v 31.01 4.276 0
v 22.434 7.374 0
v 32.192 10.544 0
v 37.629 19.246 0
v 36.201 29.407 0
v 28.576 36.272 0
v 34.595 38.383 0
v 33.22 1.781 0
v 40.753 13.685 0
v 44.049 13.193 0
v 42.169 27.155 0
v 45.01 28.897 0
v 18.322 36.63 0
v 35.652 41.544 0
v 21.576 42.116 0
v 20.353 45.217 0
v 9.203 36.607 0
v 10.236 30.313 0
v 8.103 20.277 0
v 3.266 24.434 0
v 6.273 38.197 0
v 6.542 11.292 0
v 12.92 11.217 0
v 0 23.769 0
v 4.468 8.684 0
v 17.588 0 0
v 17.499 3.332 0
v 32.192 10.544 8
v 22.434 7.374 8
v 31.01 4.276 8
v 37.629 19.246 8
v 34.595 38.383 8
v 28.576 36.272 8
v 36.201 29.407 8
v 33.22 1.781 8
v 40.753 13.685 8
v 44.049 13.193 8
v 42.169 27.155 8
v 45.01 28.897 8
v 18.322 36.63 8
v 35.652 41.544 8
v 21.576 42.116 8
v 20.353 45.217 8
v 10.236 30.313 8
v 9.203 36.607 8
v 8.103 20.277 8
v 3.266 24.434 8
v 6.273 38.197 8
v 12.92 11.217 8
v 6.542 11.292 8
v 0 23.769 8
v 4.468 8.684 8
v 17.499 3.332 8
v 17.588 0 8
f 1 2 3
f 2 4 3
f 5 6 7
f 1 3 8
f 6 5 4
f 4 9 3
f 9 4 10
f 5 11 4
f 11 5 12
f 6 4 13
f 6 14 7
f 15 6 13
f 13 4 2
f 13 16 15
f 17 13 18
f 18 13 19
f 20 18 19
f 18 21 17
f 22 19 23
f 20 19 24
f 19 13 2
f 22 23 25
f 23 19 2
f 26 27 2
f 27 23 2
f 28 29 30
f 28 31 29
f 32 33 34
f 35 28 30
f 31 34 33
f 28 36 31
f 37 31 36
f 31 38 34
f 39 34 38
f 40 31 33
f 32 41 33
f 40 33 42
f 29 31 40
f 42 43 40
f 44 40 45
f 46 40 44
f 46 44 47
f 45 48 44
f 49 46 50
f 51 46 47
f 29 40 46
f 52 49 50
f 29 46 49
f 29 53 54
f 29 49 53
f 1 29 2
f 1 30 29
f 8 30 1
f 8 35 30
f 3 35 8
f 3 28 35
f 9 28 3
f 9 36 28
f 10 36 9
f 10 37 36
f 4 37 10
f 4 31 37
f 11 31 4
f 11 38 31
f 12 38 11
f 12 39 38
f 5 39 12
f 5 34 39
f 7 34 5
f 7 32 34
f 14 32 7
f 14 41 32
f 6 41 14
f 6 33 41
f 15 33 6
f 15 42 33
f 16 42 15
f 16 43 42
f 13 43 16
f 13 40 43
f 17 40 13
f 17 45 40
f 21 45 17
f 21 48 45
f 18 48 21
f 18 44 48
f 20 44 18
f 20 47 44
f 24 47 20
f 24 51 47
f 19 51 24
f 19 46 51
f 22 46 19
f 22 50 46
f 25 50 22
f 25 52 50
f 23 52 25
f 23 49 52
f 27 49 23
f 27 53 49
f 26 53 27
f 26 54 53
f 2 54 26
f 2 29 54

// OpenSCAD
$fn = 32;

// ----------------------------------------------------------------------
// Fan rotor section: 9 blades, 15 mm hub radius, 8 mm blades
// ----------------------------------------------------------------------

// --- parameters (mm) ---
profile_height = 8;       // extrusion height
profile_points = 27;      // points of the closed outline

profile = [[37.629, 19.246], [42.169, 27.155], [45.01, 28.897], [36.201, 29.407], [34.595, 38.383], [35.652, 41.544], [28.576, 36.272], [21.576, 42.116], [20.353, 45.217], [18.322, 36.63], [9.203, 36.607], [6.273, 38.197], [10.236, 30.313], [3.266, 24.434], [0, 23.769], [8.103, 20.277], [6.542, 11.292], [4.468, 8.684], [12.92, 11.217], [17.499, 3.332], [17.588, 0], [22.434, 7.374], [31.01, 4.276], [33.22, 1.781], [32.192, 10.544], [40.753, 13.685], [44.049, 13.193]];  // single closed polygon, 27 points, counter clockwise

// --- the one profile operation ---
linear_extrude(height = profile_height) polygon(points = profile);
